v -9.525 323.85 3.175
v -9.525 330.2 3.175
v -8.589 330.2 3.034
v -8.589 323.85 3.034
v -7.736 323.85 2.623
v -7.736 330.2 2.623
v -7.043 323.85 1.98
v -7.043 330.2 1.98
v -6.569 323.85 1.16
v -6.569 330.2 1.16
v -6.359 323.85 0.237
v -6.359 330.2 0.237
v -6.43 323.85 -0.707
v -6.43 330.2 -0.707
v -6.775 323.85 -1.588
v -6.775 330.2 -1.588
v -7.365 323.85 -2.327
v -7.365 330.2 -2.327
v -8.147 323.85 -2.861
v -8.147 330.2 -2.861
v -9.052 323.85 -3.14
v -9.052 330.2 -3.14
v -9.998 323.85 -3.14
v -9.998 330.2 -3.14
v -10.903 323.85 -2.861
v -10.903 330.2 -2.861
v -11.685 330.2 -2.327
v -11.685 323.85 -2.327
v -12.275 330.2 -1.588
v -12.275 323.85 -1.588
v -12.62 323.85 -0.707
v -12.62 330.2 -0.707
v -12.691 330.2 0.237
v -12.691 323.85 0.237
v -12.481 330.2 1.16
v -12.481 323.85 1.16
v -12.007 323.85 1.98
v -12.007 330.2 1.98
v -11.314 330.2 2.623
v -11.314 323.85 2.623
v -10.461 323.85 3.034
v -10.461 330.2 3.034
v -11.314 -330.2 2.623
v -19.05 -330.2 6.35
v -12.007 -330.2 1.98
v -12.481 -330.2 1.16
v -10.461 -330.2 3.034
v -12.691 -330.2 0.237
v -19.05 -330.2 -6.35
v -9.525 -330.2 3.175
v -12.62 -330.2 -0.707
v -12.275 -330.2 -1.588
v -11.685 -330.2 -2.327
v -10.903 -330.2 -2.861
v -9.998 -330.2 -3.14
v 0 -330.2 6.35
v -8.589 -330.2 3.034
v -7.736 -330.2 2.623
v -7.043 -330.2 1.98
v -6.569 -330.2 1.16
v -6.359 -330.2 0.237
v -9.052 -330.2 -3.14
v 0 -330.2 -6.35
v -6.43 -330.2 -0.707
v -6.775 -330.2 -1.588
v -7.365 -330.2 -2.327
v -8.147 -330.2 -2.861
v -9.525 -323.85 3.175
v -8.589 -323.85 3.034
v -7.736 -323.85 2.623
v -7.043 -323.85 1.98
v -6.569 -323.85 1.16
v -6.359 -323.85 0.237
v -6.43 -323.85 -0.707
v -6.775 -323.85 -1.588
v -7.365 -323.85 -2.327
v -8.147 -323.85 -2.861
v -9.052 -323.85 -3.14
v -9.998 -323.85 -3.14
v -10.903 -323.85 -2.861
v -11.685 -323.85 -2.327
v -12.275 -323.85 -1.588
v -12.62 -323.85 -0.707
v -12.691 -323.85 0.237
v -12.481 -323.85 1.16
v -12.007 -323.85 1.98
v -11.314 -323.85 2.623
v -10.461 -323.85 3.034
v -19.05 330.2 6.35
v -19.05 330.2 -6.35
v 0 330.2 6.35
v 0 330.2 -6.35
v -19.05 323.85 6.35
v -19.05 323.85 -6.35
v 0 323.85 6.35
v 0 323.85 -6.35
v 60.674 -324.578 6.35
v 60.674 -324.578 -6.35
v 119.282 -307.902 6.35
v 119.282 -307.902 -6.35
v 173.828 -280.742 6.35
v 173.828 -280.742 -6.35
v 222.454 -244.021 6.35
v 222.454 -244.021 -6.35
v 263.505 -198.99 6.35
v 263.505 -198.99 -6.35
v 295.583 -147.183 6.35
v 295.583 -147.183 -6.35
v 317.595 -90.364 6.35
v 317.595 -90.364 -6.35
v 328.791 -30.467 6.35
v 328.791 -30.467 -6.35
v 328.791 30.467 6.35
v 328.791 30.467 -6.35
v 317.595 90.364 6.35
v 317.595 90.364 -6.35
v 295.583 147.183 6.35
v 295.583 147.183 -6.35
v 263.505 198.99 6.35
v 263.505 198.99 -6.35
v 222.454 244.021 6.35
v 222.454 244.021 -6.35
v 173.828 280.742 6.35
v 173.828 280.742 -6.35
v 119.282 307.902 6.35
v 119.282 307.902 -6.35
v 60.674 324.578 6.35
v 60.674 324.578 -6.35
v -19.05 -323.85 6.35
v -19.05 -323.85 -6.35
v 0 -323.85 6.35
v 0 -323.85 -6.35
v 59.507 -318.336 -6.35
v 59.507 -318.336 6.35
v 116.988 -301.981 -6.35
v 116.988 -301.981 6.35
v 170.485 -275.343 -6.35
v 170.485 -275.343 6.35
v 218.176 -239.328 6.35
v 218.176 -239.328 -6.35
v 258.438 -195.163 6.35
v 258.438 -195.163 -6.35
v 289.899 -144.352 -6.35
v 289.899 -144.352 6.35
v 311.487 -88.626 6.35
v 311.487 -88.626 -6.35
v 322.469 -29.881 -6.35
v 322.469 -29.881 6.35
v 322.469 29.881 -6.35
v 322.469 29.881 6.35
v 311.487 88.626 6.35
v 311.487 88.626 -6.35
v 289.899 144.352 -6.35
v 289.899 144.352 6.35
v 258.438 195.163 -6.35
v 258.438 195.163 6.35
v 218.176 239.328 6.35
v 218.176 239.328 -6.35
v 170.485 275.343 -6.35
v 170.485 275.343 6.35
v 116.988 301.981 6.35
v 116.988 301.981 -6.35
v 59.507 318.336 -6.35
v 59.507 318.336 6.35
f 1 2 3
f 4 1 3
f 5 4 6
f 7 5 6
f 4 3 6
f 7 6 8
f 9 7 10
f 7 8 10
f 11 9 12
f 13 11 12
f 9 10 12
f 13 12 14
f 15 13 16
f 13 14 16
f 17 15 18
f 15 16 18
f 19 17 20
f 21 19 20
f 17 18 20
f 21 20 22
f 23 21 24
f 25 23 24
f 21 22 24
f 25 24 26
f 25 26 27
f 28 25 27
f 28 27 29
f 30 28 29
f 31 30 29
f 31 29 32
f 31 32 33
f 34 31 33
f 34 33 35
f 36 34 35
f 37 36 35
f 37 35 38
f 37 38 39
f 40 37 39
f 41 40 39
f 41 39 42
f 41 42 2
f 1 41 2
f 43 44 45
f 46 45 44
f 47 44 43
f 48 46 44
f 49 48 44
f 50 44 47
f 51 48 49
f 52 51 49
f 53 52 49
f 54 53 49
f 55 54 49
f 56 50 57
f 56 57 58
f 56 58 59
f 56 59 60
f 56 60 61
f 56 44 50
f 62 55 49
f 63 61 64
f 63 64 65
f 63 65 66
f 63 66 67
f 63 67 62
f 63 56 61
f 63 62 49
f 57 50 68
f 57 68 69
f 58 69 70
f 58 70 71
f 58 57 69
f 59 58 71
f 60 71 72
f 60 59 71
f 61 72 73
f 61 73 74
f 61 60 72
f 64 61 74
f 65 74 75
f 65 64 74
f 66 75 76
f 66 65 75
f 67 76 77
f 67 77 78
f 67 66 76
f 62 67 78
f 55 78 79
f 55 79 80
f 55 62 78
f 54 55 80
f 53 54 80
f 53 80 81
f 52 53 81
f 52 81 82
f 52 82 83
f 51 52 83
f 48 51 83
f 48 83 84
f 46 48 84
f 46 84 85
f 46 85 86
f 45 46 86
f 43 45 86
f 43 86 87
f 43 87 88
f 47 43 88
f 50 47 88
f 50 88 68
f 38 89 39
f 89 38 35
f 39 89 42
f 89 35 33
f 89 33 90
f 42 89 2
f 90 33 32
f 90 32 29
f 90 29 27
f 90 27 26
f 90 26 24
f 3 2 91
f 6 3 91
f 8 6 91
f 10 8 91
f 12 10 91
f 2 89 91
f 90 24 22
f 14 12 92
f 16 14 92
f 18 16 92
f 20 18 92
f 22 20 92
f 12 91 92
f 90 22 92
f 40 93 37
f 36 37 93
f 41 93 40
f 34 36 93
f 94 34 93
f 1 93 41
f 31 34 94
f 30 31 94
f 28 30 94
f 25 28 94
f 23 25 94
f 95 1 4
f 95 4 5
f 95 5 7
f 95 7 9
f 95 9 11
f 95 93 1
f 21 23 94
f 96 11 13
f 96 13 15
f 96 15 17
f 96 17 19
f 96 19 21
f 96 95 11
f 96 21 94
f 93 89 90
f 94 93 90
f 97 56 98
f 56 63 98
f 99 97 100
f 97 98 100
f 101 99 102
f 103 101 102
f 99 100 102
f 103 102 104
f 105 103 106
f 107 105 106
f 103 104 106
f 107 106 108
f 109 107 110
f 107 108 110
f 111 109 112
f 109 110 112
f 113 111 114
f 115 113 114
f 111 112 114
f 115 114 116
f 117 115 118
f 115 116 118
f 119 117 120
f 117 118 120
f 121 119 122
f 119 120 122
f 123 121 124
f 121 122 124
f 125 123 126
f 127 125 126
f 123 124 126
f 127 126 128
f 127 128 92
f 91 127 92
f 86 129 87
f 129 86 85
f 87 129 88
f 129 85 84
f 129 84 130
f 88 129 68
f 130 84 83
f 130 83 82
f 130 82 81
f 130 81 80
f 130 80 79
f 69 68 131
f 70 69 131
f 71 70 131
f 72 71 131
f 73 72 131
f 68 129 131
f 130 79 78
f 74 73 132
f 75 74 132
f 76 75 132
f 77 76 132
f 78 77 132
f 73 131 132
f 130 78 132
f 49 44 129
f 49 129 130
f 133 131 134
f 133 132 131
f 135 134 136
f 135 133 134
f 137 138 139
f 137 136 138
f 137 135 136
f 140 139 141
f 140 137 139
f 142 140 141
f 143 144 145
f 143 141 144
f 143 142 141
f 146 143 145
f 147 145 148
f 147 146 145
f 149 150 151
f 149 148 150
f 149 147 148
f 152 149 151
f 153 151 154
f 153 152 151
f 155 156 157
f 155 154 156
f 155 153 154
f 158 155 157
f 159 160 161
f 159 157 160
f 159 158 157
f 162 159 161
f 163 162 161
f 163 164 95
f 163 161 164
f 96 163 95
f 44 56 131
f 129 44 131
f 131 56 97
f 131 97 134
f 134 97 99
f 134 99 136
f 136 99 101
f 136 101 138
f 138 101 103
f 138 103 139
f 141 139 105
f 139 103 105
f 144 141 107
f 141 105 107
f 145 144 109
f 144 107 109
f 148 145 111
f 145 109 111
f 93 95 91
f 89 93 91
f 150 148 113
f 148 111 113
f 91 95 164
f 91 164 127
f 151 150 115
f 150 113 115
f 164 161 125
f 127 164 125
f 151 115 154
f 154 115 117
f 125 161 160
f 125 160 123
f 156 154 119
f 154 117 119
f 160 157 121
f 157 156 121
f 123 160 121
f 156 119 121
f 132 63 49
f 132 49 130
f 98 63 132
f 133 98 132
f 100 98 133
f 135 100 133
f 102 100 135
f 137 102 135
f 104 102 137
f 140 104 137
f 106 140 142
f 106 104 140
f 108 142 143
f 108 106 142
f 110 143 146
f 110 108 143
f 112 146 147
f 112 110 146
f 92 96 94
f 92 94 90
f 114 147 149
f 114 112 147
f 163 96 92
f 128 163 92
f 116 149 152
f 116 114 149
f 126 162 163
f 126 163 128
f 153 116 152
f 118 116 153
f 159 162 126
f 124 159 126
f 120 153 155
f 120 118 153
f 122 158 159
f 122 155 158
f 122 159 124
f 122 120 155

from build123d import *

# Parameters (mm, degrees)
SKETCH1_W           = 12.7
SKETCH1_H           = 6.35
BOSS_EXTRUDE1_DEPTH = 19.05
SKETCH2_R           = 3.175
CUT_EXTRUDE1_DEPTH  = 19.05
SKETCH9_W           = 12.7
SKETCH9_H           = 6.35
REVOLVE1_ANGLE      = 90


with BuildPart() as part:
    # Sketch1 → Boss-Extrude1 (new body)
    with BuildSketch(Plane(origin=(0, 0, 0), x_dir=(0, 0, -1), z_dir=(1, 0, 0))):
        with Locations((0, 327.025)):
            Rectangle(SKETCH1_W, SKETCH1_H)
    extrude(amount=-BOSS_EXTRUDE1_DEPTH)

    # Sketch2 → Cut-Extrude1 (cut)
    with BuildSketch(Plane(origin=(0, 330.2, 0), x_dir=(1, 0, 0), z_dir=(0, 1, 0))):
        with Locations(Location((-9.525, 0, 0), (0, 0, 270))):
            Circle(SKETCH2_R)
    extrude(amount=-CUT_EXTRUDE1_DEPTH, mode=Mode.SUBTRACT)

    # Sketch9 → Revolve1 (revolve)
    with BuildSketch(Plane(origin=(0, 0, 0), x_dir=(0, 0, -1), z_dir=(1, 0, 0))):
        with Locations((0, 327.025)):
            Rectangle(SKETCH9_W, SKETCH9_H)
    revolve(axis=Axis((0, 0, -195.31411855), (0, 0, -1)), revolution_arc=REVOLVE1_ANGLE)

    # Mirror2: part across plane


with BuildPart() as part_1:
    add(part.part)
    add(part.part.mirror(Plane.ZX))


solid = part_1.part
